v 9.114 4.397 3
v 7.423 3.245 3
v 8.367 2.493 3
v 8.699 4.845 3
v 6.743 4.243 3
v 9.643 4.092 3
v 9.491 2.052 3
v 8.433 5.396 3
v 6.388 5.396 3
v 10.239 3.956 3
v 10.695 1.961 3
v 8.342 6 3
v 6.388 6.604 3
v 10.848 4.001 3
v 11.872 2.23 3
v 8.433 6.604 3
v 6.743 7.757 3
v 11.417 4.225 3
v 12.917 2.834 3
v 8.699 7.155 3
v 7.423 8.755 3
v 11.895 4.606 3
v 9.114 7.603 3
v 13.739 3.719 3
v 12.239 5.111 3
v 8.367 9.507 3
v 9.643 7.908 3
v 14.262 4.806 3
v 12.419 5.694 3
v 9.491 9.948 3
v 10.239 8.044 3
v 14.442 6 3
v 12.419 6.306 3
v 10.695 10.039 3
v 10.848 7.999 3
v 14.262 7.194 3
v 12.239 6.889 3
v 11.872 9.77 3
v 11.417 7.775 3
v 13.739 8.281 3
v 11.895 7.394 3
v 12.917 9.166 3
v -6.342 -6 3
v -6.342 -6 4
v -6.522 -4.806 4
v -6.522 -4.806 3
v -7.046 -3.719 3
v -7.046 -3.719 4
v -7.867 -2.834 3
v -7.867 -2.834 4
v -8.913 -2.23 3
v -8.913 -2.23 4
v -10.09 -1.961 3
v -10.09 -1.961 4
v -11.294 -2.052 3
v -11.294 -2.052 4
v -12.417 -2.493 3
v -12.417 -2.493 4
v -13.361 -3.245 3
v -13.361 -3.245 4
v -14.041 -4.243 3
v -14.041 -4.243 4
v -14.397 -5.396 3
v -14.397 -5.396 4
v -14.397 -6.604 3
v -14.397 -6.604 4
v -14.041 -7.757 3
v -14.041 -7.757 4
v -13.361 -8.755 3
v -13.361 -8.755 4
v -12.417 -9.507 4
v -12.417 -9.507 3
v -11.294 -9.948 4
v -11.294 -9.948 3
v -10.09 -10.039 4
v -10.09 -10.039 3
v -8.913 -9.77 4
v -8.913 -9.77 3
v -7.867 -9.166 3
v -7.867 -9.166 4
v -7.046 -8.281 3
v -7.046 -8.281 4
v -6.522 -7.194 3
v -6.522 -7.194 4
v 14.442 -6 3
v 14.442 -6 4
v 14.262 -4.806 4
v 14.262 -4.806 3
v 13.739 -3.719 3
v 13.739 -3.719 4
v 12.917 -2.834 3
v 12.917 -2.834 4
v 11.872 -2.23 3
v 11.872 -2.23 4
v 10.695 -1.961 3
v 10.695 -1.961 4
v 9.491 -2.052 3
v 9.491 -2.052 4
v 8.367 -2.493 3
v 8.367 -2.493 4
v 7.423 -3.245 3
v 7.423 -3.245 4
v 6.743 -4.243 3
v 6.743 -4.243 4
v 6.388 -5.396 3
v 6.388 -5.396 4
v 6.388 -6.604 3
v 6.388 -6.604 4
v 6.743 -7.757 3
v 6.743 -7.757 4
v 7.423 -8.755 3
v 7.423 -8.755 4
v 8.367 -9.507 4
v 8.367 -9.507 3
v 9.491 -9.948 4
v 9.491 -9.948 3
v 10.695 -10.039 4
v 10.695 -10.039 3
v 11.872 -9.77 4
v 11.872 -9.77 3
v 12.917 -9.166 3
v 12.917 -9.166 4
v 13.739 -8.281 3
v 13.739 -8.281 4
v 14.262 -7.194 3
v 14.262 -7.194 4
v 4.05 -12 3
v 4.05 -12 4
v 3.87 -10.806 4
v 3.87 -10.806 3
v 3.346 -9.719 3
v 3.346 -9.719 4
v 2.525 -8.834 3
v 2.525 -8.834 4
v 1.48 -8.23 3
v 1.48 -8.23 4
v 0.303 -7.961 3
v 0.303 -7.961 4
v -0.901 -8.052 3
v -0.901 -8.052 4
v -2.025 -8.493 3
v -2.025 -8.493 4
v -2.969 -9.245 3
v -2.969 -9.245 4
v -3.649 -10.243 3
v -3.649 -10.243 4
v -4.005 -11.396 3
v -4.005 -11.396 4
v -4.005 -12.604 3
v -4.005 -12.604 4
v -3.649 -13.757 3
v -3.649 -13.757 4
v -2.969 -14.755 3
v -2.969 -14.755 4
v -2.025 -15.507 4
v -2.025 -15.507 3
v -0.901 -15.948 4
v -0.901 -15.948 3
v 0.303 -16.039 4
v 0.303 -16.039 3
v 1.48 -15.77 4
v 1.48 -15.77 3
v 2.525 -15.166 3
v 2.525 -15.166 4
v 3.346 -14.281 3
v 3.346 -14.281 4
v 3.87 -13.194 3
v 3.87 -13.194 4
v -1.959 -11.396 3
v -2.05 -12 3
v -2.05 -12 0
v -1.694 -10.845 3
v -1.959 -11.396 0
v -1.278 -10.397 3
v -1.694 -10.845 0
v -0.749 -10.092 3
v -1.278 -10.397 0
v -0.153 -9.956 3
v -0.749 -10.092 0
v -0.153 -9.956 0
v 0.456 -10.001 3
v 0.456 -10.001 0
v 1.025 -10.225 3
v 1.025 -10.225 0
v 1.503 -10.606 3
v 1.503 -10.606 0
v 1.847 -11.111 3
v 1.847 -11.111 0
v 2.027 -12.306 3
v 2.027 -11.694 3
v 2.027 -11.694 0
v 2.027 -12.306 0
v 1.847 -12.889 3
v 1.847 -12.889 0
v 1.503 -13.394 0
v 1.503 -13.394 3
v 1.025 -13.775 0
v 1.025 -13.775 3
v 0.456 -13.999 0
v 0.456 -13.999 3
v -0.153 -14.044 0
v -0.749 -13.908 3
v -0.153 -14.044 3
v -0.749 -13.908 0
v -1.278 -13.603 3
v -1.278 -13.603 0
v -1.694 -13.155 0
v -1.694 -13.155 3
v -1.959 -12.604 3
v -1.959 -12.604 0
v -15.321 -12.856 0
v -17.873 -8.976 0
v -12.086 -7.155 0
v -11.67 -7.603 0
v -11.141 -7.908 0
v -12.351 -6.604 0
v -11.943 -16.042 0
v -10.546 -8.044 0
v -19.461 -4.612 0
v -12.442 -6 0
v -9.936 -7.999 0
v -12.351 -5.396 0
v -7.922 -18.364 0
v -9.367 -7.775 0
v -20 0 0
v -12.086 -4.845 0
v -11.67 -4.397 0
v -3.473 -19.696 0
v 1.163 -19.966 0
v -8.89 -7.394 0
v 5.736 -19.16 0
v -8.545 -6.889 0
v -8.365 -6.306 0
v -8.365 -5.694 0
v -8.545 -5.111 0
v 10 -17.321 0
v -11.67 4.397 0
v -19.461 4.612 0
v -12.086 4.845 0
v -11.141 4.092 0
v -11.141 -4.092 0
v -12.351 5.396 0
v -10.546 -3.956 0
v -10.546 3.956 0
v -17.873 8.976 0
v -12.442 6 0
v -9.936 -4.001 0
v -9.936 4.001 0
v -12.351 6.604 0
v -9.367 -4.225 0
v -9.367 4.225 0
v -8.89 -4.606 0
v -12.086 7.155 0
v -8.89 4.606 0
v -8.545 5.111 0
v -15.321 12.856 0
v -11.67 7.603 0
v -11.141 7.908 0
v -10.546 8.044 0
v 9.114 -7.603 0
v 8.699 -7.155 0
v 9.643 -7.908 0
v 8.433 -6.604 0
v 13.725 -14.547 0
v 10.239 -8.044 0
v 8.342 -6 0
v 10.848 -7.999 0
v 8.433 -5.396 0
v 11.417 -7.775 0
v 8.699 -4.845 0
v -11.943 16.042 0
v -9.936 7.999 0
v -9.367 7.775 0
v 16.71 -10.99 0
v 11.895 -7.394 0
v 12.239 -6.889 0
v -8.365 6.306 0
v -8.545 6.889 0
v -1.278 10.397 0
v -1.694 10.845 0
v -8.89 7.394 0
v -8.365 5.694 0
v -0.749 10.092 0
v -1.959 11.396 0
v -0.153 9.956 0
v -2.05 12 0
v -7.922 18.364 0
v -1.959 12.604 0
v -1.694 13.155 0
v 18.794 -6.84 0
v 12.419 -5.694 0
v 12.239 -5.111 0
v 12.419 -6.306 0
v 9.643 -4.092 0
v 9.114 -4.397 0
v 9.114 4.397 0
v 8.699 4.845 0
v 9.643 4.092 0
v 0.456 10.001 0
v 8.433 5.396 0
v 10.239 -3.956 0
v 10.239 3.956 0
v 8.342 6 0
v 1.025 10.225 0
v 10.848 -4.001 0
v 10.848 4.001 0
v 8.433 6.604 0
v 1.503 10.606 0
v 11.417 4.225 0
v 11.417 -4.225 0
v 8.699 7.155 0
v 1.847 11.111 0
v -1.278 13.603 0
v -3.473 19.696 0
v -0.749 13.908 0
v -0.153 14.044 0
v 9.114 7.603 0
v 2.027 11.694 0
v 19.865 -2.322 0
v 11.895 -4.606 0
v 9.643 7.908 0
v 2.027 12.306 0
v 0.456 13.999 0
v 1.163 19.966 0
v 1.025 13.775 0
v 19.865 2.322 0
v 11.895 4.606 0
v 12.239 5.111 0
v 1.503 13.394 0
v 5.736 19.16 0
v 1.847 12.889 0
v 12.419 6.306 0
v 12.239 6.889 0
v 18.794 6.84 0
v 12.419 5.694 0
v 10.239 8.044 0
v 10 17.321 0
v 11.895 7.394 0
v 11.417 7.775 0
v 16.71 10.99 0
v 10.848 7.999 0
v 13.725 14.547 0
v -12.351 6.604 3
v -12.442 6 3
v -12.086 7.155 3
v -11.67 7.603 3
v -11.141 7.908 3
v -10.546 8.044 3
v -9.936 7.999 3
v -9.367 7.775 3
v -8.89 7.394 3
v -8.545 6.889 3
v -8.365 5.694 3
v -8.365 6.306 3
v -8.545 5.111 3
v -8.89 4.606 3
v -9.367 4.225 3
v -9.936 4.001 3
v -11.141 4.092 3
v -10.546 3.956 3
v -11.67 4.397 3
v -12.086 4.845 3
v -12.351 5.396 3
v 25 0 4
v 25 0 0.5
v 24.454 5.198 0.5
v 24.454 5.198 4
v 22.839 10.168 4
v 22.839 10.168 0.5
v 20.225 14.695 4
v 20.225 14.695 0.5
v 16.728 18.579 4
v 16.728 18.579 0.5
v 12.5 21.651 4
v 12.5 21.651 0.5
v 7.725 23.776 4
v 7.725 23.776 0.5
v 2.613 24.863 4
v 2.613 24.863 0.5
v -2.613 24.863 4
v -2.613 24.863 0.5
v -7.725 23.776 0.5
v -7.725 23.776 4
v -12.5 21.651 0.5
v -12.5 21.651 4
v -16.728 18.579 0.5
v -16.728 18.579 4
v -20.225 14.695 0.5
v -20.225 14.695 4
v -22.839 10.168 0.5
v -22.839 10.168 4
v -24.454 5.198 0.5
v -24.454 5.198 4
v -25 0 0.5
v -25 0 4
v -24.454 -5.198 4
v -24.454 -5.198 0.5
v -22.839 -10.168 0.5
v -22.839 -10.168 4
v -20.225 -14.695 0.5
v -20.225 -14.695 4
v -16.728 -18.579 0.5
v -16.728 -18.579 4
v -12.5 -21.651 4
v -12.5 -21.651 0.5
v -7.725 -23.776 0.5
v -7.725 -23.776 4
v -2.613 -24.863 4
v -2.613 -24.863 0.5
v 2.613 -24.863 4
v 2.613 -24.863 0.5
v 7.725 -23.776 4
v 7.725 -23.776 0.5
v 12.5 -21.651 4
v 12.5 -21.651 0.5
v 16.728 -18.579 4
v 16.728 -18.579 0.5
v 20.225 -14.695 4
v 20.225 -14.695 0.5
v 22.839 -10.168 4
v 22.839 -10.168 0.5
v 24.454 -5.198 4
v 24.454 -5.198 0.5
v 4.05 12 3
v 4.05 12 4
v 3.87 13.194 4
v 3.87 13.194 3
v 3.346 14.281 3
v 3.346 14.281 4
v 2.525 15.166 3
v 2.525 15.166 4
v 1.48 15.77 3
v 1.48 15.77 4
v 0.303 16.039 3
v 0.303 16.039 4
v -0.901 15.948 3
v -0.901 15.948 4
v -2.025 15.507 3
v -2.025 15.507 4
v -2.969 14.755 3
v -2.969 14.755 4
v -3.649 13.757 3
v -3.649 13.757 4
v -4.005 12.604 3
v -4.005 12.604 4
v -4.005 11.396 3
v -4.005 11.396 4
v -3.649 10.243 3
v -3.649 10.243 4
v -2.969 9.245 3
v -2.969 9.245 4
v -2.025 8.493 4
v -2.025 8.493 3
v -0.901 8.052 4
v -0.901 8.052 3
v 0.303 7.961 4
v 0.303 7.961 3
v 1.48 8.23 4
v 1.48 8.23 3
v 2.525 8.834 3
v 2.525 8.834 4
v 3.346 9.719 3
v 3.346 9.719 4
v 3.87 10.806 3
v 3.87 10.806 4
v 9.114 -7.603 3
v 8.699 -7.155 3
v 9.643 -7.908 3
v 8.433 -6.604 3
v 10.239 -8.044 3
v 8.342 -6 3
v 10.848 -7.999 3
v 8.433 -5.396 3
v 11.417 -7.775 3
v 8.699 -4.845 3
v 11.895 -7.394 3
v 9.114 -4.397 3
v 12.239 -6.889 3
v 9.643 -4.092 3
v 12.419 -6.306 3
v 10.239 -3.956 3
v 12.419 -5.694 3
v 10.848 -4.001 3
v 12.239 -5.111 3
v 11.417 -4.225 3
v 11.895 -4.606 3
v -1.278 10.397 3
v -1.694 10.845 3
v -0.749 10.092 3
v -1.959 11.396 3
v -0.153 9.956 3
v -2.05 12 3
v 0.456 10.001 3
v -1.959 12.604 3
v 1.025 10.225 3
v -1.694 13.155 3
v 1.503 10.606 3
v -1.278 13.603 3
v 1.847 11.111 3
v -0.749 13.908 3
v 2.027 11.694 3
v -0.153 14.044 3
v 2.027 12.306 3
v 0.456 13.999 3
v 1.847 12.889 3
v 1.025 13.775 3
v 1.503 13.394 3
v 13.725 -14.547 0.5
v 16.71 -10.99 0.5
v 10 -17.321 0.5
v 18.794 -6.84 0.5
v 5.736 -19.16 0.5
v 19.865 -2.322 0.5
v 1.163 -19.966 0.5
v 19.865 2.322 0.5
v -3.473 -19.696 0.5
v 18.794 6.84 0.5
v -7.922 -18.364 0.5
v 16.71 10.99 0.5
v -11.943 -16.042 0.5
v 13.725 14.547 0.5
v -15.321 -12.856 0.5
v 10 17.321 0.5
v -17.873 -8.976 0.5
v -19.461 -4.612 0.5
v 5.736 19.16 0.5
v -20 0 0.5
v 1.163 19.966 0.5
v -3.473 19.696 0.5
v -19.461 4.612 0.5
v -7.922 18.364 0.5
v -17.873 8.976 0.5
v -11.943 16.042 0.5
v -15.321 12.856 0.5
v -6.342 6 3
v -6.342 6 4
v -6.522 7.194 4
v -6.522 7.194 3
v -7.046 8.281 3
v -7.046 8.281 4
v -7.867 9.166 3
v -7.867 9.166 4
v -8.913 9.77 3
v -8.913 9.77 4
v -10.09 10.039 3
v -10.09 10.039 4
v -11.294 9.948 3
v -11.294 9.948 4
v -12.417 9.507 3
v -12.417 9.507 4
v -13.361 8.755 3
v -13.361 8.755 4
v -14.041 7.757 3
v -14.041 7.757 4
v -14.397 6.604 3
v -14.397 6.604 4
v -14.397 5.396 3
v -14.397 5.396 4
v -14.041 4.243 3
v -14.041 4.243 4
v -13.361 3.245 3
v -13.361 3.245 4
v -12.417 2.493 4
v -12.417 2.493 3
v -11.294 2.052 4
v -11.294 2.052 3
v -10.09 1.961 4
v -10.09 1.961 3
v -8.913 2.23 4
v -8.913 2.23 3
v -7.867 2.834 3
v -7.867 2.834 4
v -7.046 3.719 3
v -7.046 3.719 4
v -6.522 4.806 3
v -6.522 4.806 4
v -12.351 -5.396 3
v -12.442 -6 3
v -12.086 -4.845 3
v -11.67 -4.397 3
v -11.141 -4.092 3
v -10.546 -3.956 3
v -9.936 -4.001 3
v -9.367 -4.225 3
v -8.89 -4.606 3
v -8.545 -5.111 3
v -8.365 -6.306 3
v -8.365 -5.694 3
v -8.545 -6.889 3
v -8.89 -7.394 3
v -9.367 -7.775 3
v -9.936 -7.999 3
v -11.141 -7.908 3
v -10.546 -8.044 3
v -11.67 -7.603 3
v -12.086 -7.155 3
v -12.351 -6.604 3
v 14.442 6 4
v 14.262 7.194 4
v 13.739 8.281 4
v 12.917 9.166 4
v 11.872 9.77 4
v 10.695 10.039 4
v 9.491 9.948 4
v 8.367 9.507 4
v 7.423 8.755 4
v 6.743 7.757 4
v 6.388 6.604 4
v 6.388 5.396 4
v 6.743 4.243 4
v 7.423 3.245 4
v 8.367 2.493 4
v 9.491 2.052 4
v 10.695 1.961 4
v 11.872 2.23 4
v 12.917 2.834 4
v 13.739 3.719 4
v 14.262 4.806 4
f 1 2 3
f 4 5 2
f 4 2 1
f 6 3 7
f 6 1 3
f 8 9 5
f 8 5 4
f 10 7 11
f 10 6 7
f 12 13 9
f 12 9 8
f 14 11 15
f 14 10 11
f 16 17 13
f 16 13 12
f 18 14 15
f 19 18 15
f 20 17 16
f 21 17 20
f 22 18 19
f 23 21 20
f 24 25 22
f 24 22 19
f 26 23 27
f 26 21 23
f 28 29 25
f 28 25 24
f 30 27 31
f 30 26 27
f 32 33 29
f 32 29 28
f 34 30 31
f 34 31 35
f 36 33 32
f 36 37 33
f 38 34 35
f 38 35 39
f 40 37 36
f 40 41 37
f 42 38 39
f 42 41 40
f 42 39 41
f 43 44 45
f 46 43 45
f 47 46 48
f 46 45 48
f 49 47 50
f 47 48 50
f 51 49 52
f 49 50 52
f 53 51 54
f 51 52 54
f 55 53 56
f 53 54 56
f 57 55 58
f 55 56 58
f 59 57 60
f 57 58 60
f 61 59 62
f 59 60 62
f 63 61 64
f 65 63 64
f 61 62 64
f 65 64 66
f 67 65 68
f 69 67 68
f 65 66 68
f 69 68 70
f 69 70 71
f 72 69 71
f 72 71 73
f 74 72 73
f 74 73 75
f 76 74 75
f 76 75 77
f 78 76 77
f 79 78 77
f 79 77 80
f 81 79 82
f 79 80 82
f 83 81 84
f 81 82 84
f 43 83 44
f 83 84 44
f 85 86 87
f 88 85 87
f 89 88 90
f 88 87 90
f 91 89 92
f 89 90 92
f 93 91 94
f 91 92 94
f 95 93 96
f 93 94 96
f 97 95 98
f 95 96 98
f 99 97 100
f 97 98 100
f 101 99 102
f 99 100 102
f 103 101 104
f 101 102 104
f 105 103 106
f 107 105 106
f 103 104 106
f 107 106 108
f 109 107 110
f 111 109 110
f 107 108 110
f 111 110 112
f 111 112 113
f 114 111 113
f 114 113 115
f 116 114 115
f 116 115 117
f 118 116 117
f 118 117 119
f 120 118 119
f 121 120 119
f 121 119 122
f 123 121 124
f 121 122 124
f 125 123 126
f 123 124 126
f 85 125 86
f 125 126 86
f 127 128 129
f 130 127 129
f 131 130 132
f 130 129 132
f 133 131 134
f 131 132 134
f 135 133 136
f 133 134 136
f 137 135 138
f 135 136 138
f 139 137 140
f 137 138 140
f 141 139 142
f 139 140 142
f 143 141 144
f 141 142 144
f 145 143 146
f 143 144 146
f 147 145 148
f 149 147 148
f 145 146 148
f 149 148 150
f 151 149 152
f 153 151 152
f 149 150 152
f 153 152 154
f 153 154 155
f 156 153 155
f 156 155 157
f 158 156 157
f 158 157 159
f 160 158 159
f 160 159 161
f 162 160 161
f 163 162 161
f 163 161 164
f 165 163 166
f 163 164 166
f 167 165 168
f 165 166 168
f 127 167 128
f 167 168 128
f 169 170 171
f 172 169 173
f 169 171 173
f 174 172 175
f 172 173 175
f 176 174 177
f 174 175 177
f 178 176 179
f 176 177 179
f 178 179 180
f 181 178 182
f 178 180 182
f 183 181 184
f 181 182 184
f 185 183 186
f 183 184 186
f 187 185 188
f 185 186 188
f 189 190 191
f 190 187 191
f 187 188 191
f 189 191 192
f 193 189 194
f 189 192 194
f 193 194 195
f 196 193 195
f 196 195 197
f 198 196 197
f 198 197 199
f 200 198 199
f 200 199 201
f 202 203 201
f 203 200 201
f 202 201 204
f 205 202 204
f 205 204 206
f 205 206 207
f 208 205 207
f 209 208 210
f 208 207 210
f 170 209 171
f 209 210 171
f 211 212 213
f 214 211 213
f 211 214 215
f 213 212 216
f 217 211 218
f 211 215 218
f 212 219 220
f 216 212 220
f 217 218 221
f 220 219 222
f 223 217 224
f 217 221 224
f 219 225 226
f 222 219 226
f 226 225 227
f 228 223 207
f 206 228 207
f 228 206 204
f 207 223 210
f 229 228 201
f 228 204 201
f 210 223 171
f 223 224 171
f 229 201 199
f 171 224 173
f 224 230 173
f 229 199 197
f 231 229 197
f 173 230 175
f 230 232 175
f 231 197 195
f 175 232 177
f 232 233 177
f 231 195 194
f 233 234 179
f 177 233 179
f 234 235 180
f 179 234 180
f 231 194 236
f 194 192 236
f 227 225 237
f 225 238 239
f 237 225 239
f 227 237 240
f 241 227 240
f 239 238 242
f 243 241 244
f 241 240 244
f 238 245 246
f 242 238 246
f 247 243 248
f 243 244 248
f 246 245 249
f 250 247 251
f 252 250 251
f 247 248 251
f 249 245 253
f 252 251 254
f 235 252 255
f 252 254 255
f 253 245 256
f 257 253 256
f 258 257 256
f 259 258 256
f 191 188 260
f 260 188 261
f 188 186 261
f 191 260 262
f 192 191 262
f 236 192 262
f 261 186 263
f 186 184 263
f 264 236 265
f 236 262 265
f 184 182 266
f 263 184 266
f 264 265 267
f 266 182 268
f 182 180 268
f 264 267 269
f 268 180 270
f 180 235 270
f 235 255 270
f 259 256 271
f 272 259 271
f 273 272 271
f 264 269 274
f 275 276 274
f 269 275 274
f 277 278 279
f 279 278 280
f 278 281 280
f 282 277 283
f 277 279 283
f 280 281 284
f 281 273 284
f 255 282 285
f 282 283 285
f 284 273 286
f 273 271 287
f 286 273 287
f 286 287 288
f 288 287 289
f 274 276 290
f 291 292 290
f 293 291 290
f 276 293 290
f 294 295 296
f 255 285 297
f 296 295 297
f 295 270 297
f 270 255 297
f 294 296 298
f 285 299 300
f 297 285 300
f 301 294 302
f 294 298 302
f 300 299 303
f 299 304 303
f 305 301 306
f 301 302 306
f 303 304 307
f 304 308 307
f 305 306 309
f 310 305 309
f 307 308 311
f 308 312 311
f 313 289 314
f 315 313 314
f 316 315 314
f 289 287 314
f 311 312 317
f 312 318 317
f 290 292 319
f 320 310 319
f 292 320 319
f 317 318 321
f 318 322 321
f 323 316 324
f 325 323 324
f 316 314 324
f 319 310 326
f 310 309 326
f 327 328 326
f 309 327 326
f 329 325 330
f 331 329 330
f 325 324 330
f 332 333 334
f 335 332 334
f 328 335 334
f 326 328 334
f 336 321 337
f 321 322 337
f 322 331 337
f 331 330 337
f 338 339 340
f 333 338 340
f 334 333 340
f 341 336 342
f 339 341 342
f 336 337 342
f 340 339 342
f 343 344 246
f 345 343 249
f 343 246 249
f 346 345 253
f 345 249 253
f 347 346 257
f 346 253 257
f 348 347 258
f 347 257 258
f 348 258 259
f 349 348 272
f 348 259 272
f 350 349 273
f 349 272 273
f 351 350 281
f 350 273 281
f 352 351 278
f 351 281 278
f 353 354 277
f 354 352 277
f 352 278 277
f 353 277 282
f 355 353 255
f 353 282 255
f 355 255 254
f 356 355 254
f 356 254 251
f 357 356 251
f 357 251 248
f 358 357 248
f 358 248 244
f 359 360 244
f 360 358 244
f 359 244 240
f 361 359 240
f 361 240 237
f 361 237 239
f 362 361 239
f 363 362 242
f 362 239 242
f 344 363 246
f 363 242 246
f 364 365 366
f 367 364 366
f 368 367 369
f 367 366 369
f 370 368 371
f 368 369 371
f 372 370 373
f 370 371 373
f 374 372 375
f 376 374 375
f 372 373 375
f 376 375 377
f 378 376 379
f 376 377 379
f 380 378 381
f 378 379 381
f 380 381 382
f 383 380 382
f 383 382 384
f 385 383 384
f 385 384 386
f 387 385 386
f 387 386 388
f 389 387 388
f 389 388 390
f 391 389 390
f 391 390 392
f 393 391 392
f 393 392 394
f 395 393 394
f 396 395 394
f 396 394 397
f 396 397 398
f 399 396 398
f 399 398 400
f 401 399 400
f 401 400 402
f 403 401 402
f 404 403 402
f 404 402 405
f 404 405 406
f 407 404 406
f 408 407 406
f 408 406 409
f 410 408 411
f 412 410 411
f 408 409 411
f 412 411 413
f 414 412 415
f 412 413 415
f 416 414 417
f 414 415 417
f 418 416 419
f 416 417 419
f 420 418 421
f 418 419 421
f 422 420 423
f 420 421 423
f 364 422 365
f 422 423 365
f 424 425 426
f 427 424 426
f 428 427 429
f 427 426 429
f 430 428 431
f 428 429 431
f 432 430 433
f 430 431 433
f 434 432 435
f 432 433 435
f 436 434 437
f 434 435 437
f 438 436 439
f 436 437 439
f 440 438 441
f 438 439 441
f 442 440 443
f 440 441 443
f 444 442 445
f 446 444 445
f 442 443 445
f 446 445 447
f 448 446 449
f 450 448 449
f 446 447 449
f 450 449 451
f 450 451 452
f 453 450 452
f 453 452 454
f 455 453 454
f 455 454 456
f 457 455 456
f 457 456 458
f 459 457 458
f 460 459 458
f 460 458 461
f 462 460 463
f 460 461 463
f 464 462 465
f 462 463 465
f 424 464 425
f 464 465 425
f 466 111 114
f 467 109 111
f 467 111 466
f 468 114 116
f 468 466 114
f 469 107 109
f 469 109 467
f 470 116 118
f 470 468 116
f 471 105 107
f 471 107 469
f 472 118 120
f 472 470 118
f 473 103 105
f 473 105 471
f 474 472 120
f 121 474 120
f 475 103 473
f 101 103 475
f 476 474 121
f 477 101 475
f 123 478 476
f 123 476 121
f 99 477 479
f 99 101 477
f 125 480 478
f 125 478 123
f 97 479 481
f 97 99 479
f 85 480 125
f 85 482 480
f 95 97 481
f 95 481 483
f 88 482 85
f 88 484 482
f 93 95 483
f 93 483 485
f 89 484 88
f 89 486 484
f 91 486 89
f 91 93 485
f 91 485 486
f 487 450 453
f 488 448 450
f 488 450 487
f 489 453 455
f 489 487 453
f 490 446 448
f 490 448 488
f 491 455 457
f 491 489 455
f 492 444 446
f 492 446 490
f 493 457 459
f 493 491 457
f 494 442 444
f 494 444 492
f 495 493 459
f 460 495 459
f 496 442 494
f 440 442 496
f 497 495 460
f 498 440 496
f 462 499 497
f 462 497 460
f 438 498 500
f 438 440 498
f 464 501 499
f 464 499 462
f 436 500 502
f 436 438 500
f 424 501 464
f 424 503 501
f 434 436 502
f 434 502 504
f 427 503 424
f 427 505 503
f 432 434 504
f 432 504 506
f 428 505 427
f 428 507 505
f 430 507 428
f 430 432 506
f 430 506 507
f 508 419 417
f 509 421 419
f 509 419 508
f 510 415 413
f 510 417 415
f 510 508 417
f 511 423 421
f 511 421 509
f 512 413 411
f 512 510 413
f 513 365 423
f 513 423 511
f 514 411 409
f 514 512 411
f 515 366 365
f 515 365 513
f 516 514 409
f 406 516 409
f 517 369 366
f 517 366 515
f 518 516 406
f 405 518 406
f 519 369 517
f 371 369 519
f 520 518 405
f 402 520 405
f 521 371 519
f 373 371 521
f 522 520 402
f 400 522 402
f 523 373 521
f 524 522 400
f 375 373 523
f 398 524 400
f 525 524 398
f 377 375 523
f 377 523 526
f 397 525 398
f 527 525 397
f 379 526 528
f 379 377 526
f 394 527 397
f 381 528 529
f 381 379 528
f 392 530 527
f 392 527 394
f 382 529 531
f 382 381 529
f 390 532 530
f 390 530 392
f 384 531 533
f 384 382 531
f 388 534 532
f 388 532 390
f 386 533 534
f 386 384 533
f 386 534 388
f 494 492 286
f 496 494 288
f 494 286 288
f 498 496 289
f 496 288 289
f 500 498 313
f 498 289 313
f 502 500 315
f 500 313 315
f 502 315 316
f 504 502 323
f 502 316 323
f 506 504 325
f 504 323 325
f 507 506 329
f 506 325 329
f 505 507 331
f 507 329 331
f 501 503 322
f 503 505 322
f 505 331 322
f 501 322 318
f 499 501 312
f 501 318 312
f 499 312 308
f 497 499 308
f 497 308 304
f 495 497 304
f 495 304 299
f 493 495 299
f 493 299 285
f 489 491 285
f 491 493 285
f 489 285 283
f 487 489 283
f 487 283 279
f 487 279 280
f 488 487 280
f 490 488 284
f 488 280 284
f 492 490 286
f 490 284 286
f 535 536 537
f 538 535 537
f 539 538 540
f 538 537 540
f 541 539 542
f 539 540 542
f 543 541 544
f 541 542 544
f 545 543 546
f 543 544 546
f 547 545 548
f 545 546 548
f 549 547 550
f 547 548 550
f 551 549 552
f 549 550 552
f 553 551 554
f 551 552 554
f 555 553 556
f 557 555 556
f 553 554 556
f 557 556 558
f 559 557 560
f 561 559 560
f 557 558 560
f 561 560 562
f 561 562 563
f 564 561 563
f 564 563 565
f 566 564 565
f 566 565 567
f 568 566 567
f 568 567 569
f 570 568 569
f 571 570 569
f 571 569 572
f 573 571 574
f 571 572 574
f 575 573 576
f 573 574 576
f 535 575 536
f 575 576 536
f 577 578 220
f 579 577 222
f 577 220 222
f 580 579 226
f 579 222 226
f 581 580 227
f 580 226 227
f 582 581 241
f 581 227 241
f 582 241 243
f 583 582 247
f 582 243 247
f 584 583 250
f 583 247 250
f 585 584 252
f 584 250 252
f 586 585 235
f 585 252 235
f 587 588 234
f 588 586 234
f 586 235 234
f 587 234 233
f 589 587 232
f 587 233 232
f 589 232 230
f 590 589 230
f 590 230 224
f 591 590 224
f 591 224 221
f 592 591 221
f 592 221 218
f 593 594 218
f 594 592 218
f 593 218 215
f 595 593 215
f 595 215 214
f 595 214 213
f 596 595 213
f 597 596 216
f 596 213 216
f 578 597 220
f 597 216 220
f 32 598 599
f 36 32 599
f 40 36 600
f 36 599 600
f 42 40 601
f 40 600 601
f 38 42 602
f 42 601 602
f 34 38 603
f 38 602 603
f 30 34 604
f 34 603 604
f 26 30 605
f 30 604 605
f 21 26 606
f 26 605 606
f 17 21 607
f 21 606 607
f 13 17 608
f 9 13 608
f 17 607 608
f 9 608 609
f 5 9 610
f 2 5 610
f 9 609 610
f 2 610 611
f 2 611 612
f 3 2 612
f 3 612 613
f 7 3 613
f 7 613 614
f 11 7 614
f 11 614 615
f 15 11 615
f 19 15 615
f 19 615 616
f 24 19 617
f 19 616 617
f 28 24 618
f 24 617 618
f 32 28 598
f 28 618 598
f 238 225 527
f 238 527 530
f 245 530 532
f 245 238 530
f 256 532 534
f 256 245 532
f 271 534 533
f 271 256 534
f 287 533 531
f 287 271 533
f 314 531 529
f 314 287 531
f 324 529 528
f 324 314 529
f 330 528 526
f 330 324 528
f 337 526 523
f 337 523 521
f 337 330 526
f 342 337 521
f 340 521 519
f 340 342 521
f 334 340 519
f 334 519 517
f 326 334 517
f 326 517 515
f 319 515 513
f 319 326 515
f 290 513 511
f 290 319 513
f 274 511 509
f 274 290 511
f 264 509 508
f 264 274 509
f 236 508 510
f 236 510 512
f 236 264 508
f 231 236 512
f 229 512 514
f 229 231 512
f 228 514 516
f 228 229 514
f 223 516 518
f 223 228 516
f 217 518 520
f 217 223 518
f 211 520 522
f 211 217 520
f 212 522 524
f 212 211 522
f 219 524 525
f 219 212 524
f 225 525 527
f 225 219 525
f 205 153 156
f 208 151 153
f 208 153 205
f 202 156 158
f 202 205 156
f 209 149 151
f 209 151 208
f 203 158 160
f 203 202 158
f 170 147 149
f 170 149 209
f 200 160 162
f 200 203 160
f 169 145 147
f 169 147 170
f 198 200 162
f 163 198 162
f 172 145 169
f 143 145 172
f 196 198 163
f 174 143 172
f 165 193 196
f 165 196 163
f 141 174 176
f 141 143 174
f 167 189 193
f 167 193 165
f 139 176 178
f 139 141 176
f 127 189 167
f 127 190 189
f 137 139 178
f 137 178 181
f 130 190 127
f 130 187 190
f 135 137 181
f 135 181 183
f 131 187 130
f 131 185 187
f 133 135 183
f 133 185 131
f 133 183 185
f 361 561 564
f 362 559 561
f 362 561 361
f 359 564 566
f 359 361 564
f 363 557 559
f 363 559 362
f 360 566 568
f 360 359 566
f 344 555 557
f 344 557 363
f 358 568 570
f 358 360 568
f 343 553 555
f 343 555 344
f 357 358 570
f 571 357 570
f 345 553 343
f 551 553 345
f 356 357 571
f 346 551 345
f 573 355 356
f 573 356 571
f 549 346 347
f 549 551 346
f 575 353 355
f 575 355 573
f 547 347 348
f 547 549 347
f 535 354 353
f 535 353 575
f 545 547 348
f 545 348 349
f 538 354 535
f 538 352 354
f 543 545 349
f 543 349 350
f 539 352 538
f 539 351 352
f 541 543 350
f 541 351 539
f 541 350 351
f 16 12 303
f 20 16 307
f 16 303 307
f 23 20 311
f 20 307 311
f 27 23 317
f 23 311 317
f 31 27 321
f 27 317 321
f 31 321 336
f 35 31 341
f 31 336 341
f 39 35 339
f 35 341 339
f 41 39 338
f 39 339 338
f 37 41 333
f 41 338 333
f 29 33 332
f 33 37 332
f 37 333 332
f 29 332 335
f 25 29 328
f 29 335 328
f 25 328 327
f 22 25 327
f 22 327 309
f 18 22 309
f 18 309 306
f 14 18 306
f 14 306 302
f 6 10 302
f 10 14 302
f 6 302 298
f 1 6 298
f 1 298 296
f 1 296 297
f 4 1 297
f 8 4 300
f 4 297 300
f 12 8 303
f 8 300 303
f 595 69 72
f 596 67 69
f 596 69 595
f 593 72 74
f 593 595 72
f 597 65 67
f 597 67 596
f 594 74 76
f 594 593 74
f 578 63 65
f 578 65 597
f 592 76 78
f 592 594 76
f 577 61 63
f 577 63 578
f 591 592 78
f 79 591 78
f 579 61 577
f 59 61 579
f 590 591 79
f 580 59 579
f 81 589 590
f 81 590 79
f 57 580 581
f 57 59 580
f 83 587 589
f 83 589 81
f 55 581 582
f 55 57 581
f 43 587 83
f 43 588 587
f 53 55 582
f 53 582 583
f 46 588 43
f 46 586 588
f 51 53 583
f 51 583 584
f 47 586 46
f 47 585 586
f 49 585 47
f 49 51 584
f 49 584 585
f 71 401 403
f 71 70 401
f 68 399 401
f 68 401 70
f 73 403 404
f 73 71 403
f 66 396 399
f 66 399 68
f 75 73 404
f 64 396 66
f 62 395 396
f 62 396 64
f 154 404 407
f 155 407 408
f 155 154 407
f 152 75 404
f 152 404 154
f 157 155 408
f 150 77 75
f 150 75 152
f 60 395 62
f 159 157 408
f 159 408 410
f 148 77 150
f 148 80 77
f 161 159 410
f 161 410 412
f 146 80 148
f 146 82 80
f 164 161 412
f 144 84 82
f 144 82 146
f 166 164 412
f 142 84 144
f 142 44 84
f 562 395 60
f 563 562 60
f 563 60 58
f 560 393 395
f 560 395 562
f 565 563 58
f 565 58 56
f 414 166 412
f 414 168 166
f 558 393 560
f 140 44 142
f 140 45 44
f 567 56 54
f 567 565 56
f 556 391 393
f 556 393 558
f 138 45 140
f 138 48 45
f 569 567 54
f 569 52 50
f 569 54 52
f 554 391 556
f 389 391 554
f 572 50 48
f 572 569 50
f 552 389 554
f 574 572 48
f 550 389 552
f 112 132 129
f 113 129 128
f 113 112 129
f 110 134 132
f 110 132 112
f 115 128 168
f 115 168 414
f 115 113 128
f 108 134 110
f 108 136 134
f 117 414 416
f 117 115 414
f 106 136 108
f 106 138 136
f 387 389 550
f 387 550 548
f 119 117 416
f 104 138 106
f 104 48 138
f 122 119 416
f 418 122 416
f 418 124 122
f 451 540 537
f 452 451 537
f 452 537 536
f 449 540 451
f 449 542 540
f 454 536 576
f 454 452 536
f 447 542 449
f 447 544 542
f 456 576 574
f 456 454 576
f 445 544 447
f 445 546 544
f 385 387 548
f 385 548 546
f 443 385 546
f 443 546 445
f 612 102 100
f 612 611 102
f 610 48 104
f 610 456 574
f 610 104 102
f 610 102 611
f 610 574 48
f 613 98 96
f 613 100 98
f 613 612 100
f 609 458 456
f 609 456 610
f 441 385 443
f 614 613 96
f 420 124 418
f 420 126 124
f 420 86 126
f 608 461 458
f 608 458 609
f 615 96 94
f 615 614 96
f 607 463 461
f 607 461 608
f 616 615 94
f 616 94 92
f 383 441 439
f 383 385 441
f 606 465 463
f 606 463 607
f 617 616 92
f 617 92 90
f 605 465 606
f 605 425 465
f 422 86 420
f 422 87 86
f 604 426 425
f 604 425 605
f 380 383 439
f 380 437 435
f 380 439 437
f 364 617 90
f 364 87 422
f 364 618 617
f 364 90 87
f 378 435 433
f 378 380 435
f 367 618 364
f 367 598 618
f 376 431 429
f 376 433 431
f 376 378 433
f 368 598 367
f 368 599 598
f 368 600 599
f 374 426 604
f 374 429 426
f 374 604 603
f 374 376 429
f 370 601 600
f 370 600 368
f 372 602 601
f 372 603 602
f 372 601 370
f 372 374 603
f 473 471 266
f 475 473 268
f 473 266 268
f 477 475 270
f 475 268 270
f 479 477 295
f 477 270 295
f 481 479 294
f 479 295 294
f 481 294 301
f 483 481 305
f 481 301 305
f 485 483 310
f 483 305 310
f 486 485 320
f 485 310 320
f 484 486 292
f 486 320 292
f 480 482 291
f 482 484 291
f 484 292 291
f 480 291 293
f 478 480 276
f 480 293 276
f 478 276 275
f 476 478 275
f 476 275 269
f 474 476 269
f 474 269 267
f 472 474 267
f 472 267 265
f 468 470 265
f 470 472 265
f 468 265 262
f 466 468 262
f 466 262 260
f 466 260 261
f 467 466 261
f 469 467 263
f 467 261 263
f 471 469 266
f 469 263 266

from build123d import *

# Parameters (mm, degrees)
SKETCH_1_R          = 25
EXTRUDE_1_DEPTH     = 4
SKETCH_4_R          = 2.05
CUT_EXTRUDE_1_DEPTH = 10
SKETCH_5_R          = 4.05
SKETCH_5_R_2        = 2.05
CUT_EXTRUDE_2_DEPTH = 1
SKETCH_6_R          = 25
SKETCH_6_R_2        = 20
CUT_EXTRUDE_3_DEPTH = 0.5


with BuildPart() as part:
    # 草图1 → 凸台-拉伸1 (new body)
    with BuildSketch(Plane.XY):
        Circle(SKETCH_1_R)
    extrude(amount=EXTRUDE_1_DEPTH)

    # 草图4 → 切除-拉伸1 (cut)
    with BuildSketch(Plane(origin=(0, 0, 0), x_dir=(-1, 0, 0), z_dir=(0, 0, -1))):
        with Locations((-10.392304845, -6)):
            Circle(SKETCH_4_R)
        with Locations((-10.392304845, 6)):
            Circle(SKETCH_4_R)
        with Locations((0, 12)):
            Circle(SKETCH_4_R)
        with Locations((10.392304845, 6)):
            Circle(SKETCH_4_R)
        with Locations((10.392304845, -6)):
            Circle(SKETCH_4_R)
        with Locations((0, -12)):
            Circle(SKETCH_4_R)
    extrude(amount=-CUT_EXTRUDE_1_DEPTH, mode=Mode.SUBTRACT)

    # 草图5 → 切除-拉伸2 (cut)
    with BuildSketch(Plane.XY.offset(4)):
        with Locations((-10.392304845, 6)):
            Circle(SKETCH_5_R)
        with Locations((-10.392304845, 6)):
            Circle(SKETCH_5_R_2, mode=Mode.SUBTRACT)
        with Locations((-10.392304845, -6)):
            Circle(SKETCH_5_R)
        with Locations((-10.392304845, -6)):
            Circle(SKETCH_5_R_2, mode=Mode.SUBTRACT)
        with Locations((0, -12)):
            Circle(SKETCH_5_R)
        with Locations((0, -12)):
            Circle(SKETCH_5_R_2, mode=Mode.SUBTRACT)
        with Locations((10.392304845, -6)):
            Circle(SKETCH_5_R)
        with Locations((10.392304845, -6)):
            Circle(SKETCH_5_R_2, mode=Mode.SUBTRACT)
        with Locations((10.392304845, 6)):
            Circle(SKETCH_5_R)
        with Locations((10.392304845, 6)):
            Circle(SKETCH_5_R_2, mode=Mode.SUBTRACT)
        with Locations((0, 12)):
            Circle(SKETCH_5_R)
        with Locations((0, 12)):
            Circle(SKETCH_5_R_2, mode=Mode.SUBTRACT)
    extrude(amount=-CUT_EXTRUDE_2_DEPTH, mode=Mode.SUBTRACT)

    # 草图6 → 切除-拉伸3 (cut)
    with BuildSketch(Plane(origin=(0, 0, 0), x_dir=(-1, 0, 0), z_dir=(0, 0, -1))):
        Circle(SKETCH_6_R)
        Circle(SKETCH_6_R_2, mode=Mode.SUBTRACT)
    extrude(amount=-CUT_EXTRUDE_3_DEPTH, mode=Mode.SUBTRACT)


solid = part.part
